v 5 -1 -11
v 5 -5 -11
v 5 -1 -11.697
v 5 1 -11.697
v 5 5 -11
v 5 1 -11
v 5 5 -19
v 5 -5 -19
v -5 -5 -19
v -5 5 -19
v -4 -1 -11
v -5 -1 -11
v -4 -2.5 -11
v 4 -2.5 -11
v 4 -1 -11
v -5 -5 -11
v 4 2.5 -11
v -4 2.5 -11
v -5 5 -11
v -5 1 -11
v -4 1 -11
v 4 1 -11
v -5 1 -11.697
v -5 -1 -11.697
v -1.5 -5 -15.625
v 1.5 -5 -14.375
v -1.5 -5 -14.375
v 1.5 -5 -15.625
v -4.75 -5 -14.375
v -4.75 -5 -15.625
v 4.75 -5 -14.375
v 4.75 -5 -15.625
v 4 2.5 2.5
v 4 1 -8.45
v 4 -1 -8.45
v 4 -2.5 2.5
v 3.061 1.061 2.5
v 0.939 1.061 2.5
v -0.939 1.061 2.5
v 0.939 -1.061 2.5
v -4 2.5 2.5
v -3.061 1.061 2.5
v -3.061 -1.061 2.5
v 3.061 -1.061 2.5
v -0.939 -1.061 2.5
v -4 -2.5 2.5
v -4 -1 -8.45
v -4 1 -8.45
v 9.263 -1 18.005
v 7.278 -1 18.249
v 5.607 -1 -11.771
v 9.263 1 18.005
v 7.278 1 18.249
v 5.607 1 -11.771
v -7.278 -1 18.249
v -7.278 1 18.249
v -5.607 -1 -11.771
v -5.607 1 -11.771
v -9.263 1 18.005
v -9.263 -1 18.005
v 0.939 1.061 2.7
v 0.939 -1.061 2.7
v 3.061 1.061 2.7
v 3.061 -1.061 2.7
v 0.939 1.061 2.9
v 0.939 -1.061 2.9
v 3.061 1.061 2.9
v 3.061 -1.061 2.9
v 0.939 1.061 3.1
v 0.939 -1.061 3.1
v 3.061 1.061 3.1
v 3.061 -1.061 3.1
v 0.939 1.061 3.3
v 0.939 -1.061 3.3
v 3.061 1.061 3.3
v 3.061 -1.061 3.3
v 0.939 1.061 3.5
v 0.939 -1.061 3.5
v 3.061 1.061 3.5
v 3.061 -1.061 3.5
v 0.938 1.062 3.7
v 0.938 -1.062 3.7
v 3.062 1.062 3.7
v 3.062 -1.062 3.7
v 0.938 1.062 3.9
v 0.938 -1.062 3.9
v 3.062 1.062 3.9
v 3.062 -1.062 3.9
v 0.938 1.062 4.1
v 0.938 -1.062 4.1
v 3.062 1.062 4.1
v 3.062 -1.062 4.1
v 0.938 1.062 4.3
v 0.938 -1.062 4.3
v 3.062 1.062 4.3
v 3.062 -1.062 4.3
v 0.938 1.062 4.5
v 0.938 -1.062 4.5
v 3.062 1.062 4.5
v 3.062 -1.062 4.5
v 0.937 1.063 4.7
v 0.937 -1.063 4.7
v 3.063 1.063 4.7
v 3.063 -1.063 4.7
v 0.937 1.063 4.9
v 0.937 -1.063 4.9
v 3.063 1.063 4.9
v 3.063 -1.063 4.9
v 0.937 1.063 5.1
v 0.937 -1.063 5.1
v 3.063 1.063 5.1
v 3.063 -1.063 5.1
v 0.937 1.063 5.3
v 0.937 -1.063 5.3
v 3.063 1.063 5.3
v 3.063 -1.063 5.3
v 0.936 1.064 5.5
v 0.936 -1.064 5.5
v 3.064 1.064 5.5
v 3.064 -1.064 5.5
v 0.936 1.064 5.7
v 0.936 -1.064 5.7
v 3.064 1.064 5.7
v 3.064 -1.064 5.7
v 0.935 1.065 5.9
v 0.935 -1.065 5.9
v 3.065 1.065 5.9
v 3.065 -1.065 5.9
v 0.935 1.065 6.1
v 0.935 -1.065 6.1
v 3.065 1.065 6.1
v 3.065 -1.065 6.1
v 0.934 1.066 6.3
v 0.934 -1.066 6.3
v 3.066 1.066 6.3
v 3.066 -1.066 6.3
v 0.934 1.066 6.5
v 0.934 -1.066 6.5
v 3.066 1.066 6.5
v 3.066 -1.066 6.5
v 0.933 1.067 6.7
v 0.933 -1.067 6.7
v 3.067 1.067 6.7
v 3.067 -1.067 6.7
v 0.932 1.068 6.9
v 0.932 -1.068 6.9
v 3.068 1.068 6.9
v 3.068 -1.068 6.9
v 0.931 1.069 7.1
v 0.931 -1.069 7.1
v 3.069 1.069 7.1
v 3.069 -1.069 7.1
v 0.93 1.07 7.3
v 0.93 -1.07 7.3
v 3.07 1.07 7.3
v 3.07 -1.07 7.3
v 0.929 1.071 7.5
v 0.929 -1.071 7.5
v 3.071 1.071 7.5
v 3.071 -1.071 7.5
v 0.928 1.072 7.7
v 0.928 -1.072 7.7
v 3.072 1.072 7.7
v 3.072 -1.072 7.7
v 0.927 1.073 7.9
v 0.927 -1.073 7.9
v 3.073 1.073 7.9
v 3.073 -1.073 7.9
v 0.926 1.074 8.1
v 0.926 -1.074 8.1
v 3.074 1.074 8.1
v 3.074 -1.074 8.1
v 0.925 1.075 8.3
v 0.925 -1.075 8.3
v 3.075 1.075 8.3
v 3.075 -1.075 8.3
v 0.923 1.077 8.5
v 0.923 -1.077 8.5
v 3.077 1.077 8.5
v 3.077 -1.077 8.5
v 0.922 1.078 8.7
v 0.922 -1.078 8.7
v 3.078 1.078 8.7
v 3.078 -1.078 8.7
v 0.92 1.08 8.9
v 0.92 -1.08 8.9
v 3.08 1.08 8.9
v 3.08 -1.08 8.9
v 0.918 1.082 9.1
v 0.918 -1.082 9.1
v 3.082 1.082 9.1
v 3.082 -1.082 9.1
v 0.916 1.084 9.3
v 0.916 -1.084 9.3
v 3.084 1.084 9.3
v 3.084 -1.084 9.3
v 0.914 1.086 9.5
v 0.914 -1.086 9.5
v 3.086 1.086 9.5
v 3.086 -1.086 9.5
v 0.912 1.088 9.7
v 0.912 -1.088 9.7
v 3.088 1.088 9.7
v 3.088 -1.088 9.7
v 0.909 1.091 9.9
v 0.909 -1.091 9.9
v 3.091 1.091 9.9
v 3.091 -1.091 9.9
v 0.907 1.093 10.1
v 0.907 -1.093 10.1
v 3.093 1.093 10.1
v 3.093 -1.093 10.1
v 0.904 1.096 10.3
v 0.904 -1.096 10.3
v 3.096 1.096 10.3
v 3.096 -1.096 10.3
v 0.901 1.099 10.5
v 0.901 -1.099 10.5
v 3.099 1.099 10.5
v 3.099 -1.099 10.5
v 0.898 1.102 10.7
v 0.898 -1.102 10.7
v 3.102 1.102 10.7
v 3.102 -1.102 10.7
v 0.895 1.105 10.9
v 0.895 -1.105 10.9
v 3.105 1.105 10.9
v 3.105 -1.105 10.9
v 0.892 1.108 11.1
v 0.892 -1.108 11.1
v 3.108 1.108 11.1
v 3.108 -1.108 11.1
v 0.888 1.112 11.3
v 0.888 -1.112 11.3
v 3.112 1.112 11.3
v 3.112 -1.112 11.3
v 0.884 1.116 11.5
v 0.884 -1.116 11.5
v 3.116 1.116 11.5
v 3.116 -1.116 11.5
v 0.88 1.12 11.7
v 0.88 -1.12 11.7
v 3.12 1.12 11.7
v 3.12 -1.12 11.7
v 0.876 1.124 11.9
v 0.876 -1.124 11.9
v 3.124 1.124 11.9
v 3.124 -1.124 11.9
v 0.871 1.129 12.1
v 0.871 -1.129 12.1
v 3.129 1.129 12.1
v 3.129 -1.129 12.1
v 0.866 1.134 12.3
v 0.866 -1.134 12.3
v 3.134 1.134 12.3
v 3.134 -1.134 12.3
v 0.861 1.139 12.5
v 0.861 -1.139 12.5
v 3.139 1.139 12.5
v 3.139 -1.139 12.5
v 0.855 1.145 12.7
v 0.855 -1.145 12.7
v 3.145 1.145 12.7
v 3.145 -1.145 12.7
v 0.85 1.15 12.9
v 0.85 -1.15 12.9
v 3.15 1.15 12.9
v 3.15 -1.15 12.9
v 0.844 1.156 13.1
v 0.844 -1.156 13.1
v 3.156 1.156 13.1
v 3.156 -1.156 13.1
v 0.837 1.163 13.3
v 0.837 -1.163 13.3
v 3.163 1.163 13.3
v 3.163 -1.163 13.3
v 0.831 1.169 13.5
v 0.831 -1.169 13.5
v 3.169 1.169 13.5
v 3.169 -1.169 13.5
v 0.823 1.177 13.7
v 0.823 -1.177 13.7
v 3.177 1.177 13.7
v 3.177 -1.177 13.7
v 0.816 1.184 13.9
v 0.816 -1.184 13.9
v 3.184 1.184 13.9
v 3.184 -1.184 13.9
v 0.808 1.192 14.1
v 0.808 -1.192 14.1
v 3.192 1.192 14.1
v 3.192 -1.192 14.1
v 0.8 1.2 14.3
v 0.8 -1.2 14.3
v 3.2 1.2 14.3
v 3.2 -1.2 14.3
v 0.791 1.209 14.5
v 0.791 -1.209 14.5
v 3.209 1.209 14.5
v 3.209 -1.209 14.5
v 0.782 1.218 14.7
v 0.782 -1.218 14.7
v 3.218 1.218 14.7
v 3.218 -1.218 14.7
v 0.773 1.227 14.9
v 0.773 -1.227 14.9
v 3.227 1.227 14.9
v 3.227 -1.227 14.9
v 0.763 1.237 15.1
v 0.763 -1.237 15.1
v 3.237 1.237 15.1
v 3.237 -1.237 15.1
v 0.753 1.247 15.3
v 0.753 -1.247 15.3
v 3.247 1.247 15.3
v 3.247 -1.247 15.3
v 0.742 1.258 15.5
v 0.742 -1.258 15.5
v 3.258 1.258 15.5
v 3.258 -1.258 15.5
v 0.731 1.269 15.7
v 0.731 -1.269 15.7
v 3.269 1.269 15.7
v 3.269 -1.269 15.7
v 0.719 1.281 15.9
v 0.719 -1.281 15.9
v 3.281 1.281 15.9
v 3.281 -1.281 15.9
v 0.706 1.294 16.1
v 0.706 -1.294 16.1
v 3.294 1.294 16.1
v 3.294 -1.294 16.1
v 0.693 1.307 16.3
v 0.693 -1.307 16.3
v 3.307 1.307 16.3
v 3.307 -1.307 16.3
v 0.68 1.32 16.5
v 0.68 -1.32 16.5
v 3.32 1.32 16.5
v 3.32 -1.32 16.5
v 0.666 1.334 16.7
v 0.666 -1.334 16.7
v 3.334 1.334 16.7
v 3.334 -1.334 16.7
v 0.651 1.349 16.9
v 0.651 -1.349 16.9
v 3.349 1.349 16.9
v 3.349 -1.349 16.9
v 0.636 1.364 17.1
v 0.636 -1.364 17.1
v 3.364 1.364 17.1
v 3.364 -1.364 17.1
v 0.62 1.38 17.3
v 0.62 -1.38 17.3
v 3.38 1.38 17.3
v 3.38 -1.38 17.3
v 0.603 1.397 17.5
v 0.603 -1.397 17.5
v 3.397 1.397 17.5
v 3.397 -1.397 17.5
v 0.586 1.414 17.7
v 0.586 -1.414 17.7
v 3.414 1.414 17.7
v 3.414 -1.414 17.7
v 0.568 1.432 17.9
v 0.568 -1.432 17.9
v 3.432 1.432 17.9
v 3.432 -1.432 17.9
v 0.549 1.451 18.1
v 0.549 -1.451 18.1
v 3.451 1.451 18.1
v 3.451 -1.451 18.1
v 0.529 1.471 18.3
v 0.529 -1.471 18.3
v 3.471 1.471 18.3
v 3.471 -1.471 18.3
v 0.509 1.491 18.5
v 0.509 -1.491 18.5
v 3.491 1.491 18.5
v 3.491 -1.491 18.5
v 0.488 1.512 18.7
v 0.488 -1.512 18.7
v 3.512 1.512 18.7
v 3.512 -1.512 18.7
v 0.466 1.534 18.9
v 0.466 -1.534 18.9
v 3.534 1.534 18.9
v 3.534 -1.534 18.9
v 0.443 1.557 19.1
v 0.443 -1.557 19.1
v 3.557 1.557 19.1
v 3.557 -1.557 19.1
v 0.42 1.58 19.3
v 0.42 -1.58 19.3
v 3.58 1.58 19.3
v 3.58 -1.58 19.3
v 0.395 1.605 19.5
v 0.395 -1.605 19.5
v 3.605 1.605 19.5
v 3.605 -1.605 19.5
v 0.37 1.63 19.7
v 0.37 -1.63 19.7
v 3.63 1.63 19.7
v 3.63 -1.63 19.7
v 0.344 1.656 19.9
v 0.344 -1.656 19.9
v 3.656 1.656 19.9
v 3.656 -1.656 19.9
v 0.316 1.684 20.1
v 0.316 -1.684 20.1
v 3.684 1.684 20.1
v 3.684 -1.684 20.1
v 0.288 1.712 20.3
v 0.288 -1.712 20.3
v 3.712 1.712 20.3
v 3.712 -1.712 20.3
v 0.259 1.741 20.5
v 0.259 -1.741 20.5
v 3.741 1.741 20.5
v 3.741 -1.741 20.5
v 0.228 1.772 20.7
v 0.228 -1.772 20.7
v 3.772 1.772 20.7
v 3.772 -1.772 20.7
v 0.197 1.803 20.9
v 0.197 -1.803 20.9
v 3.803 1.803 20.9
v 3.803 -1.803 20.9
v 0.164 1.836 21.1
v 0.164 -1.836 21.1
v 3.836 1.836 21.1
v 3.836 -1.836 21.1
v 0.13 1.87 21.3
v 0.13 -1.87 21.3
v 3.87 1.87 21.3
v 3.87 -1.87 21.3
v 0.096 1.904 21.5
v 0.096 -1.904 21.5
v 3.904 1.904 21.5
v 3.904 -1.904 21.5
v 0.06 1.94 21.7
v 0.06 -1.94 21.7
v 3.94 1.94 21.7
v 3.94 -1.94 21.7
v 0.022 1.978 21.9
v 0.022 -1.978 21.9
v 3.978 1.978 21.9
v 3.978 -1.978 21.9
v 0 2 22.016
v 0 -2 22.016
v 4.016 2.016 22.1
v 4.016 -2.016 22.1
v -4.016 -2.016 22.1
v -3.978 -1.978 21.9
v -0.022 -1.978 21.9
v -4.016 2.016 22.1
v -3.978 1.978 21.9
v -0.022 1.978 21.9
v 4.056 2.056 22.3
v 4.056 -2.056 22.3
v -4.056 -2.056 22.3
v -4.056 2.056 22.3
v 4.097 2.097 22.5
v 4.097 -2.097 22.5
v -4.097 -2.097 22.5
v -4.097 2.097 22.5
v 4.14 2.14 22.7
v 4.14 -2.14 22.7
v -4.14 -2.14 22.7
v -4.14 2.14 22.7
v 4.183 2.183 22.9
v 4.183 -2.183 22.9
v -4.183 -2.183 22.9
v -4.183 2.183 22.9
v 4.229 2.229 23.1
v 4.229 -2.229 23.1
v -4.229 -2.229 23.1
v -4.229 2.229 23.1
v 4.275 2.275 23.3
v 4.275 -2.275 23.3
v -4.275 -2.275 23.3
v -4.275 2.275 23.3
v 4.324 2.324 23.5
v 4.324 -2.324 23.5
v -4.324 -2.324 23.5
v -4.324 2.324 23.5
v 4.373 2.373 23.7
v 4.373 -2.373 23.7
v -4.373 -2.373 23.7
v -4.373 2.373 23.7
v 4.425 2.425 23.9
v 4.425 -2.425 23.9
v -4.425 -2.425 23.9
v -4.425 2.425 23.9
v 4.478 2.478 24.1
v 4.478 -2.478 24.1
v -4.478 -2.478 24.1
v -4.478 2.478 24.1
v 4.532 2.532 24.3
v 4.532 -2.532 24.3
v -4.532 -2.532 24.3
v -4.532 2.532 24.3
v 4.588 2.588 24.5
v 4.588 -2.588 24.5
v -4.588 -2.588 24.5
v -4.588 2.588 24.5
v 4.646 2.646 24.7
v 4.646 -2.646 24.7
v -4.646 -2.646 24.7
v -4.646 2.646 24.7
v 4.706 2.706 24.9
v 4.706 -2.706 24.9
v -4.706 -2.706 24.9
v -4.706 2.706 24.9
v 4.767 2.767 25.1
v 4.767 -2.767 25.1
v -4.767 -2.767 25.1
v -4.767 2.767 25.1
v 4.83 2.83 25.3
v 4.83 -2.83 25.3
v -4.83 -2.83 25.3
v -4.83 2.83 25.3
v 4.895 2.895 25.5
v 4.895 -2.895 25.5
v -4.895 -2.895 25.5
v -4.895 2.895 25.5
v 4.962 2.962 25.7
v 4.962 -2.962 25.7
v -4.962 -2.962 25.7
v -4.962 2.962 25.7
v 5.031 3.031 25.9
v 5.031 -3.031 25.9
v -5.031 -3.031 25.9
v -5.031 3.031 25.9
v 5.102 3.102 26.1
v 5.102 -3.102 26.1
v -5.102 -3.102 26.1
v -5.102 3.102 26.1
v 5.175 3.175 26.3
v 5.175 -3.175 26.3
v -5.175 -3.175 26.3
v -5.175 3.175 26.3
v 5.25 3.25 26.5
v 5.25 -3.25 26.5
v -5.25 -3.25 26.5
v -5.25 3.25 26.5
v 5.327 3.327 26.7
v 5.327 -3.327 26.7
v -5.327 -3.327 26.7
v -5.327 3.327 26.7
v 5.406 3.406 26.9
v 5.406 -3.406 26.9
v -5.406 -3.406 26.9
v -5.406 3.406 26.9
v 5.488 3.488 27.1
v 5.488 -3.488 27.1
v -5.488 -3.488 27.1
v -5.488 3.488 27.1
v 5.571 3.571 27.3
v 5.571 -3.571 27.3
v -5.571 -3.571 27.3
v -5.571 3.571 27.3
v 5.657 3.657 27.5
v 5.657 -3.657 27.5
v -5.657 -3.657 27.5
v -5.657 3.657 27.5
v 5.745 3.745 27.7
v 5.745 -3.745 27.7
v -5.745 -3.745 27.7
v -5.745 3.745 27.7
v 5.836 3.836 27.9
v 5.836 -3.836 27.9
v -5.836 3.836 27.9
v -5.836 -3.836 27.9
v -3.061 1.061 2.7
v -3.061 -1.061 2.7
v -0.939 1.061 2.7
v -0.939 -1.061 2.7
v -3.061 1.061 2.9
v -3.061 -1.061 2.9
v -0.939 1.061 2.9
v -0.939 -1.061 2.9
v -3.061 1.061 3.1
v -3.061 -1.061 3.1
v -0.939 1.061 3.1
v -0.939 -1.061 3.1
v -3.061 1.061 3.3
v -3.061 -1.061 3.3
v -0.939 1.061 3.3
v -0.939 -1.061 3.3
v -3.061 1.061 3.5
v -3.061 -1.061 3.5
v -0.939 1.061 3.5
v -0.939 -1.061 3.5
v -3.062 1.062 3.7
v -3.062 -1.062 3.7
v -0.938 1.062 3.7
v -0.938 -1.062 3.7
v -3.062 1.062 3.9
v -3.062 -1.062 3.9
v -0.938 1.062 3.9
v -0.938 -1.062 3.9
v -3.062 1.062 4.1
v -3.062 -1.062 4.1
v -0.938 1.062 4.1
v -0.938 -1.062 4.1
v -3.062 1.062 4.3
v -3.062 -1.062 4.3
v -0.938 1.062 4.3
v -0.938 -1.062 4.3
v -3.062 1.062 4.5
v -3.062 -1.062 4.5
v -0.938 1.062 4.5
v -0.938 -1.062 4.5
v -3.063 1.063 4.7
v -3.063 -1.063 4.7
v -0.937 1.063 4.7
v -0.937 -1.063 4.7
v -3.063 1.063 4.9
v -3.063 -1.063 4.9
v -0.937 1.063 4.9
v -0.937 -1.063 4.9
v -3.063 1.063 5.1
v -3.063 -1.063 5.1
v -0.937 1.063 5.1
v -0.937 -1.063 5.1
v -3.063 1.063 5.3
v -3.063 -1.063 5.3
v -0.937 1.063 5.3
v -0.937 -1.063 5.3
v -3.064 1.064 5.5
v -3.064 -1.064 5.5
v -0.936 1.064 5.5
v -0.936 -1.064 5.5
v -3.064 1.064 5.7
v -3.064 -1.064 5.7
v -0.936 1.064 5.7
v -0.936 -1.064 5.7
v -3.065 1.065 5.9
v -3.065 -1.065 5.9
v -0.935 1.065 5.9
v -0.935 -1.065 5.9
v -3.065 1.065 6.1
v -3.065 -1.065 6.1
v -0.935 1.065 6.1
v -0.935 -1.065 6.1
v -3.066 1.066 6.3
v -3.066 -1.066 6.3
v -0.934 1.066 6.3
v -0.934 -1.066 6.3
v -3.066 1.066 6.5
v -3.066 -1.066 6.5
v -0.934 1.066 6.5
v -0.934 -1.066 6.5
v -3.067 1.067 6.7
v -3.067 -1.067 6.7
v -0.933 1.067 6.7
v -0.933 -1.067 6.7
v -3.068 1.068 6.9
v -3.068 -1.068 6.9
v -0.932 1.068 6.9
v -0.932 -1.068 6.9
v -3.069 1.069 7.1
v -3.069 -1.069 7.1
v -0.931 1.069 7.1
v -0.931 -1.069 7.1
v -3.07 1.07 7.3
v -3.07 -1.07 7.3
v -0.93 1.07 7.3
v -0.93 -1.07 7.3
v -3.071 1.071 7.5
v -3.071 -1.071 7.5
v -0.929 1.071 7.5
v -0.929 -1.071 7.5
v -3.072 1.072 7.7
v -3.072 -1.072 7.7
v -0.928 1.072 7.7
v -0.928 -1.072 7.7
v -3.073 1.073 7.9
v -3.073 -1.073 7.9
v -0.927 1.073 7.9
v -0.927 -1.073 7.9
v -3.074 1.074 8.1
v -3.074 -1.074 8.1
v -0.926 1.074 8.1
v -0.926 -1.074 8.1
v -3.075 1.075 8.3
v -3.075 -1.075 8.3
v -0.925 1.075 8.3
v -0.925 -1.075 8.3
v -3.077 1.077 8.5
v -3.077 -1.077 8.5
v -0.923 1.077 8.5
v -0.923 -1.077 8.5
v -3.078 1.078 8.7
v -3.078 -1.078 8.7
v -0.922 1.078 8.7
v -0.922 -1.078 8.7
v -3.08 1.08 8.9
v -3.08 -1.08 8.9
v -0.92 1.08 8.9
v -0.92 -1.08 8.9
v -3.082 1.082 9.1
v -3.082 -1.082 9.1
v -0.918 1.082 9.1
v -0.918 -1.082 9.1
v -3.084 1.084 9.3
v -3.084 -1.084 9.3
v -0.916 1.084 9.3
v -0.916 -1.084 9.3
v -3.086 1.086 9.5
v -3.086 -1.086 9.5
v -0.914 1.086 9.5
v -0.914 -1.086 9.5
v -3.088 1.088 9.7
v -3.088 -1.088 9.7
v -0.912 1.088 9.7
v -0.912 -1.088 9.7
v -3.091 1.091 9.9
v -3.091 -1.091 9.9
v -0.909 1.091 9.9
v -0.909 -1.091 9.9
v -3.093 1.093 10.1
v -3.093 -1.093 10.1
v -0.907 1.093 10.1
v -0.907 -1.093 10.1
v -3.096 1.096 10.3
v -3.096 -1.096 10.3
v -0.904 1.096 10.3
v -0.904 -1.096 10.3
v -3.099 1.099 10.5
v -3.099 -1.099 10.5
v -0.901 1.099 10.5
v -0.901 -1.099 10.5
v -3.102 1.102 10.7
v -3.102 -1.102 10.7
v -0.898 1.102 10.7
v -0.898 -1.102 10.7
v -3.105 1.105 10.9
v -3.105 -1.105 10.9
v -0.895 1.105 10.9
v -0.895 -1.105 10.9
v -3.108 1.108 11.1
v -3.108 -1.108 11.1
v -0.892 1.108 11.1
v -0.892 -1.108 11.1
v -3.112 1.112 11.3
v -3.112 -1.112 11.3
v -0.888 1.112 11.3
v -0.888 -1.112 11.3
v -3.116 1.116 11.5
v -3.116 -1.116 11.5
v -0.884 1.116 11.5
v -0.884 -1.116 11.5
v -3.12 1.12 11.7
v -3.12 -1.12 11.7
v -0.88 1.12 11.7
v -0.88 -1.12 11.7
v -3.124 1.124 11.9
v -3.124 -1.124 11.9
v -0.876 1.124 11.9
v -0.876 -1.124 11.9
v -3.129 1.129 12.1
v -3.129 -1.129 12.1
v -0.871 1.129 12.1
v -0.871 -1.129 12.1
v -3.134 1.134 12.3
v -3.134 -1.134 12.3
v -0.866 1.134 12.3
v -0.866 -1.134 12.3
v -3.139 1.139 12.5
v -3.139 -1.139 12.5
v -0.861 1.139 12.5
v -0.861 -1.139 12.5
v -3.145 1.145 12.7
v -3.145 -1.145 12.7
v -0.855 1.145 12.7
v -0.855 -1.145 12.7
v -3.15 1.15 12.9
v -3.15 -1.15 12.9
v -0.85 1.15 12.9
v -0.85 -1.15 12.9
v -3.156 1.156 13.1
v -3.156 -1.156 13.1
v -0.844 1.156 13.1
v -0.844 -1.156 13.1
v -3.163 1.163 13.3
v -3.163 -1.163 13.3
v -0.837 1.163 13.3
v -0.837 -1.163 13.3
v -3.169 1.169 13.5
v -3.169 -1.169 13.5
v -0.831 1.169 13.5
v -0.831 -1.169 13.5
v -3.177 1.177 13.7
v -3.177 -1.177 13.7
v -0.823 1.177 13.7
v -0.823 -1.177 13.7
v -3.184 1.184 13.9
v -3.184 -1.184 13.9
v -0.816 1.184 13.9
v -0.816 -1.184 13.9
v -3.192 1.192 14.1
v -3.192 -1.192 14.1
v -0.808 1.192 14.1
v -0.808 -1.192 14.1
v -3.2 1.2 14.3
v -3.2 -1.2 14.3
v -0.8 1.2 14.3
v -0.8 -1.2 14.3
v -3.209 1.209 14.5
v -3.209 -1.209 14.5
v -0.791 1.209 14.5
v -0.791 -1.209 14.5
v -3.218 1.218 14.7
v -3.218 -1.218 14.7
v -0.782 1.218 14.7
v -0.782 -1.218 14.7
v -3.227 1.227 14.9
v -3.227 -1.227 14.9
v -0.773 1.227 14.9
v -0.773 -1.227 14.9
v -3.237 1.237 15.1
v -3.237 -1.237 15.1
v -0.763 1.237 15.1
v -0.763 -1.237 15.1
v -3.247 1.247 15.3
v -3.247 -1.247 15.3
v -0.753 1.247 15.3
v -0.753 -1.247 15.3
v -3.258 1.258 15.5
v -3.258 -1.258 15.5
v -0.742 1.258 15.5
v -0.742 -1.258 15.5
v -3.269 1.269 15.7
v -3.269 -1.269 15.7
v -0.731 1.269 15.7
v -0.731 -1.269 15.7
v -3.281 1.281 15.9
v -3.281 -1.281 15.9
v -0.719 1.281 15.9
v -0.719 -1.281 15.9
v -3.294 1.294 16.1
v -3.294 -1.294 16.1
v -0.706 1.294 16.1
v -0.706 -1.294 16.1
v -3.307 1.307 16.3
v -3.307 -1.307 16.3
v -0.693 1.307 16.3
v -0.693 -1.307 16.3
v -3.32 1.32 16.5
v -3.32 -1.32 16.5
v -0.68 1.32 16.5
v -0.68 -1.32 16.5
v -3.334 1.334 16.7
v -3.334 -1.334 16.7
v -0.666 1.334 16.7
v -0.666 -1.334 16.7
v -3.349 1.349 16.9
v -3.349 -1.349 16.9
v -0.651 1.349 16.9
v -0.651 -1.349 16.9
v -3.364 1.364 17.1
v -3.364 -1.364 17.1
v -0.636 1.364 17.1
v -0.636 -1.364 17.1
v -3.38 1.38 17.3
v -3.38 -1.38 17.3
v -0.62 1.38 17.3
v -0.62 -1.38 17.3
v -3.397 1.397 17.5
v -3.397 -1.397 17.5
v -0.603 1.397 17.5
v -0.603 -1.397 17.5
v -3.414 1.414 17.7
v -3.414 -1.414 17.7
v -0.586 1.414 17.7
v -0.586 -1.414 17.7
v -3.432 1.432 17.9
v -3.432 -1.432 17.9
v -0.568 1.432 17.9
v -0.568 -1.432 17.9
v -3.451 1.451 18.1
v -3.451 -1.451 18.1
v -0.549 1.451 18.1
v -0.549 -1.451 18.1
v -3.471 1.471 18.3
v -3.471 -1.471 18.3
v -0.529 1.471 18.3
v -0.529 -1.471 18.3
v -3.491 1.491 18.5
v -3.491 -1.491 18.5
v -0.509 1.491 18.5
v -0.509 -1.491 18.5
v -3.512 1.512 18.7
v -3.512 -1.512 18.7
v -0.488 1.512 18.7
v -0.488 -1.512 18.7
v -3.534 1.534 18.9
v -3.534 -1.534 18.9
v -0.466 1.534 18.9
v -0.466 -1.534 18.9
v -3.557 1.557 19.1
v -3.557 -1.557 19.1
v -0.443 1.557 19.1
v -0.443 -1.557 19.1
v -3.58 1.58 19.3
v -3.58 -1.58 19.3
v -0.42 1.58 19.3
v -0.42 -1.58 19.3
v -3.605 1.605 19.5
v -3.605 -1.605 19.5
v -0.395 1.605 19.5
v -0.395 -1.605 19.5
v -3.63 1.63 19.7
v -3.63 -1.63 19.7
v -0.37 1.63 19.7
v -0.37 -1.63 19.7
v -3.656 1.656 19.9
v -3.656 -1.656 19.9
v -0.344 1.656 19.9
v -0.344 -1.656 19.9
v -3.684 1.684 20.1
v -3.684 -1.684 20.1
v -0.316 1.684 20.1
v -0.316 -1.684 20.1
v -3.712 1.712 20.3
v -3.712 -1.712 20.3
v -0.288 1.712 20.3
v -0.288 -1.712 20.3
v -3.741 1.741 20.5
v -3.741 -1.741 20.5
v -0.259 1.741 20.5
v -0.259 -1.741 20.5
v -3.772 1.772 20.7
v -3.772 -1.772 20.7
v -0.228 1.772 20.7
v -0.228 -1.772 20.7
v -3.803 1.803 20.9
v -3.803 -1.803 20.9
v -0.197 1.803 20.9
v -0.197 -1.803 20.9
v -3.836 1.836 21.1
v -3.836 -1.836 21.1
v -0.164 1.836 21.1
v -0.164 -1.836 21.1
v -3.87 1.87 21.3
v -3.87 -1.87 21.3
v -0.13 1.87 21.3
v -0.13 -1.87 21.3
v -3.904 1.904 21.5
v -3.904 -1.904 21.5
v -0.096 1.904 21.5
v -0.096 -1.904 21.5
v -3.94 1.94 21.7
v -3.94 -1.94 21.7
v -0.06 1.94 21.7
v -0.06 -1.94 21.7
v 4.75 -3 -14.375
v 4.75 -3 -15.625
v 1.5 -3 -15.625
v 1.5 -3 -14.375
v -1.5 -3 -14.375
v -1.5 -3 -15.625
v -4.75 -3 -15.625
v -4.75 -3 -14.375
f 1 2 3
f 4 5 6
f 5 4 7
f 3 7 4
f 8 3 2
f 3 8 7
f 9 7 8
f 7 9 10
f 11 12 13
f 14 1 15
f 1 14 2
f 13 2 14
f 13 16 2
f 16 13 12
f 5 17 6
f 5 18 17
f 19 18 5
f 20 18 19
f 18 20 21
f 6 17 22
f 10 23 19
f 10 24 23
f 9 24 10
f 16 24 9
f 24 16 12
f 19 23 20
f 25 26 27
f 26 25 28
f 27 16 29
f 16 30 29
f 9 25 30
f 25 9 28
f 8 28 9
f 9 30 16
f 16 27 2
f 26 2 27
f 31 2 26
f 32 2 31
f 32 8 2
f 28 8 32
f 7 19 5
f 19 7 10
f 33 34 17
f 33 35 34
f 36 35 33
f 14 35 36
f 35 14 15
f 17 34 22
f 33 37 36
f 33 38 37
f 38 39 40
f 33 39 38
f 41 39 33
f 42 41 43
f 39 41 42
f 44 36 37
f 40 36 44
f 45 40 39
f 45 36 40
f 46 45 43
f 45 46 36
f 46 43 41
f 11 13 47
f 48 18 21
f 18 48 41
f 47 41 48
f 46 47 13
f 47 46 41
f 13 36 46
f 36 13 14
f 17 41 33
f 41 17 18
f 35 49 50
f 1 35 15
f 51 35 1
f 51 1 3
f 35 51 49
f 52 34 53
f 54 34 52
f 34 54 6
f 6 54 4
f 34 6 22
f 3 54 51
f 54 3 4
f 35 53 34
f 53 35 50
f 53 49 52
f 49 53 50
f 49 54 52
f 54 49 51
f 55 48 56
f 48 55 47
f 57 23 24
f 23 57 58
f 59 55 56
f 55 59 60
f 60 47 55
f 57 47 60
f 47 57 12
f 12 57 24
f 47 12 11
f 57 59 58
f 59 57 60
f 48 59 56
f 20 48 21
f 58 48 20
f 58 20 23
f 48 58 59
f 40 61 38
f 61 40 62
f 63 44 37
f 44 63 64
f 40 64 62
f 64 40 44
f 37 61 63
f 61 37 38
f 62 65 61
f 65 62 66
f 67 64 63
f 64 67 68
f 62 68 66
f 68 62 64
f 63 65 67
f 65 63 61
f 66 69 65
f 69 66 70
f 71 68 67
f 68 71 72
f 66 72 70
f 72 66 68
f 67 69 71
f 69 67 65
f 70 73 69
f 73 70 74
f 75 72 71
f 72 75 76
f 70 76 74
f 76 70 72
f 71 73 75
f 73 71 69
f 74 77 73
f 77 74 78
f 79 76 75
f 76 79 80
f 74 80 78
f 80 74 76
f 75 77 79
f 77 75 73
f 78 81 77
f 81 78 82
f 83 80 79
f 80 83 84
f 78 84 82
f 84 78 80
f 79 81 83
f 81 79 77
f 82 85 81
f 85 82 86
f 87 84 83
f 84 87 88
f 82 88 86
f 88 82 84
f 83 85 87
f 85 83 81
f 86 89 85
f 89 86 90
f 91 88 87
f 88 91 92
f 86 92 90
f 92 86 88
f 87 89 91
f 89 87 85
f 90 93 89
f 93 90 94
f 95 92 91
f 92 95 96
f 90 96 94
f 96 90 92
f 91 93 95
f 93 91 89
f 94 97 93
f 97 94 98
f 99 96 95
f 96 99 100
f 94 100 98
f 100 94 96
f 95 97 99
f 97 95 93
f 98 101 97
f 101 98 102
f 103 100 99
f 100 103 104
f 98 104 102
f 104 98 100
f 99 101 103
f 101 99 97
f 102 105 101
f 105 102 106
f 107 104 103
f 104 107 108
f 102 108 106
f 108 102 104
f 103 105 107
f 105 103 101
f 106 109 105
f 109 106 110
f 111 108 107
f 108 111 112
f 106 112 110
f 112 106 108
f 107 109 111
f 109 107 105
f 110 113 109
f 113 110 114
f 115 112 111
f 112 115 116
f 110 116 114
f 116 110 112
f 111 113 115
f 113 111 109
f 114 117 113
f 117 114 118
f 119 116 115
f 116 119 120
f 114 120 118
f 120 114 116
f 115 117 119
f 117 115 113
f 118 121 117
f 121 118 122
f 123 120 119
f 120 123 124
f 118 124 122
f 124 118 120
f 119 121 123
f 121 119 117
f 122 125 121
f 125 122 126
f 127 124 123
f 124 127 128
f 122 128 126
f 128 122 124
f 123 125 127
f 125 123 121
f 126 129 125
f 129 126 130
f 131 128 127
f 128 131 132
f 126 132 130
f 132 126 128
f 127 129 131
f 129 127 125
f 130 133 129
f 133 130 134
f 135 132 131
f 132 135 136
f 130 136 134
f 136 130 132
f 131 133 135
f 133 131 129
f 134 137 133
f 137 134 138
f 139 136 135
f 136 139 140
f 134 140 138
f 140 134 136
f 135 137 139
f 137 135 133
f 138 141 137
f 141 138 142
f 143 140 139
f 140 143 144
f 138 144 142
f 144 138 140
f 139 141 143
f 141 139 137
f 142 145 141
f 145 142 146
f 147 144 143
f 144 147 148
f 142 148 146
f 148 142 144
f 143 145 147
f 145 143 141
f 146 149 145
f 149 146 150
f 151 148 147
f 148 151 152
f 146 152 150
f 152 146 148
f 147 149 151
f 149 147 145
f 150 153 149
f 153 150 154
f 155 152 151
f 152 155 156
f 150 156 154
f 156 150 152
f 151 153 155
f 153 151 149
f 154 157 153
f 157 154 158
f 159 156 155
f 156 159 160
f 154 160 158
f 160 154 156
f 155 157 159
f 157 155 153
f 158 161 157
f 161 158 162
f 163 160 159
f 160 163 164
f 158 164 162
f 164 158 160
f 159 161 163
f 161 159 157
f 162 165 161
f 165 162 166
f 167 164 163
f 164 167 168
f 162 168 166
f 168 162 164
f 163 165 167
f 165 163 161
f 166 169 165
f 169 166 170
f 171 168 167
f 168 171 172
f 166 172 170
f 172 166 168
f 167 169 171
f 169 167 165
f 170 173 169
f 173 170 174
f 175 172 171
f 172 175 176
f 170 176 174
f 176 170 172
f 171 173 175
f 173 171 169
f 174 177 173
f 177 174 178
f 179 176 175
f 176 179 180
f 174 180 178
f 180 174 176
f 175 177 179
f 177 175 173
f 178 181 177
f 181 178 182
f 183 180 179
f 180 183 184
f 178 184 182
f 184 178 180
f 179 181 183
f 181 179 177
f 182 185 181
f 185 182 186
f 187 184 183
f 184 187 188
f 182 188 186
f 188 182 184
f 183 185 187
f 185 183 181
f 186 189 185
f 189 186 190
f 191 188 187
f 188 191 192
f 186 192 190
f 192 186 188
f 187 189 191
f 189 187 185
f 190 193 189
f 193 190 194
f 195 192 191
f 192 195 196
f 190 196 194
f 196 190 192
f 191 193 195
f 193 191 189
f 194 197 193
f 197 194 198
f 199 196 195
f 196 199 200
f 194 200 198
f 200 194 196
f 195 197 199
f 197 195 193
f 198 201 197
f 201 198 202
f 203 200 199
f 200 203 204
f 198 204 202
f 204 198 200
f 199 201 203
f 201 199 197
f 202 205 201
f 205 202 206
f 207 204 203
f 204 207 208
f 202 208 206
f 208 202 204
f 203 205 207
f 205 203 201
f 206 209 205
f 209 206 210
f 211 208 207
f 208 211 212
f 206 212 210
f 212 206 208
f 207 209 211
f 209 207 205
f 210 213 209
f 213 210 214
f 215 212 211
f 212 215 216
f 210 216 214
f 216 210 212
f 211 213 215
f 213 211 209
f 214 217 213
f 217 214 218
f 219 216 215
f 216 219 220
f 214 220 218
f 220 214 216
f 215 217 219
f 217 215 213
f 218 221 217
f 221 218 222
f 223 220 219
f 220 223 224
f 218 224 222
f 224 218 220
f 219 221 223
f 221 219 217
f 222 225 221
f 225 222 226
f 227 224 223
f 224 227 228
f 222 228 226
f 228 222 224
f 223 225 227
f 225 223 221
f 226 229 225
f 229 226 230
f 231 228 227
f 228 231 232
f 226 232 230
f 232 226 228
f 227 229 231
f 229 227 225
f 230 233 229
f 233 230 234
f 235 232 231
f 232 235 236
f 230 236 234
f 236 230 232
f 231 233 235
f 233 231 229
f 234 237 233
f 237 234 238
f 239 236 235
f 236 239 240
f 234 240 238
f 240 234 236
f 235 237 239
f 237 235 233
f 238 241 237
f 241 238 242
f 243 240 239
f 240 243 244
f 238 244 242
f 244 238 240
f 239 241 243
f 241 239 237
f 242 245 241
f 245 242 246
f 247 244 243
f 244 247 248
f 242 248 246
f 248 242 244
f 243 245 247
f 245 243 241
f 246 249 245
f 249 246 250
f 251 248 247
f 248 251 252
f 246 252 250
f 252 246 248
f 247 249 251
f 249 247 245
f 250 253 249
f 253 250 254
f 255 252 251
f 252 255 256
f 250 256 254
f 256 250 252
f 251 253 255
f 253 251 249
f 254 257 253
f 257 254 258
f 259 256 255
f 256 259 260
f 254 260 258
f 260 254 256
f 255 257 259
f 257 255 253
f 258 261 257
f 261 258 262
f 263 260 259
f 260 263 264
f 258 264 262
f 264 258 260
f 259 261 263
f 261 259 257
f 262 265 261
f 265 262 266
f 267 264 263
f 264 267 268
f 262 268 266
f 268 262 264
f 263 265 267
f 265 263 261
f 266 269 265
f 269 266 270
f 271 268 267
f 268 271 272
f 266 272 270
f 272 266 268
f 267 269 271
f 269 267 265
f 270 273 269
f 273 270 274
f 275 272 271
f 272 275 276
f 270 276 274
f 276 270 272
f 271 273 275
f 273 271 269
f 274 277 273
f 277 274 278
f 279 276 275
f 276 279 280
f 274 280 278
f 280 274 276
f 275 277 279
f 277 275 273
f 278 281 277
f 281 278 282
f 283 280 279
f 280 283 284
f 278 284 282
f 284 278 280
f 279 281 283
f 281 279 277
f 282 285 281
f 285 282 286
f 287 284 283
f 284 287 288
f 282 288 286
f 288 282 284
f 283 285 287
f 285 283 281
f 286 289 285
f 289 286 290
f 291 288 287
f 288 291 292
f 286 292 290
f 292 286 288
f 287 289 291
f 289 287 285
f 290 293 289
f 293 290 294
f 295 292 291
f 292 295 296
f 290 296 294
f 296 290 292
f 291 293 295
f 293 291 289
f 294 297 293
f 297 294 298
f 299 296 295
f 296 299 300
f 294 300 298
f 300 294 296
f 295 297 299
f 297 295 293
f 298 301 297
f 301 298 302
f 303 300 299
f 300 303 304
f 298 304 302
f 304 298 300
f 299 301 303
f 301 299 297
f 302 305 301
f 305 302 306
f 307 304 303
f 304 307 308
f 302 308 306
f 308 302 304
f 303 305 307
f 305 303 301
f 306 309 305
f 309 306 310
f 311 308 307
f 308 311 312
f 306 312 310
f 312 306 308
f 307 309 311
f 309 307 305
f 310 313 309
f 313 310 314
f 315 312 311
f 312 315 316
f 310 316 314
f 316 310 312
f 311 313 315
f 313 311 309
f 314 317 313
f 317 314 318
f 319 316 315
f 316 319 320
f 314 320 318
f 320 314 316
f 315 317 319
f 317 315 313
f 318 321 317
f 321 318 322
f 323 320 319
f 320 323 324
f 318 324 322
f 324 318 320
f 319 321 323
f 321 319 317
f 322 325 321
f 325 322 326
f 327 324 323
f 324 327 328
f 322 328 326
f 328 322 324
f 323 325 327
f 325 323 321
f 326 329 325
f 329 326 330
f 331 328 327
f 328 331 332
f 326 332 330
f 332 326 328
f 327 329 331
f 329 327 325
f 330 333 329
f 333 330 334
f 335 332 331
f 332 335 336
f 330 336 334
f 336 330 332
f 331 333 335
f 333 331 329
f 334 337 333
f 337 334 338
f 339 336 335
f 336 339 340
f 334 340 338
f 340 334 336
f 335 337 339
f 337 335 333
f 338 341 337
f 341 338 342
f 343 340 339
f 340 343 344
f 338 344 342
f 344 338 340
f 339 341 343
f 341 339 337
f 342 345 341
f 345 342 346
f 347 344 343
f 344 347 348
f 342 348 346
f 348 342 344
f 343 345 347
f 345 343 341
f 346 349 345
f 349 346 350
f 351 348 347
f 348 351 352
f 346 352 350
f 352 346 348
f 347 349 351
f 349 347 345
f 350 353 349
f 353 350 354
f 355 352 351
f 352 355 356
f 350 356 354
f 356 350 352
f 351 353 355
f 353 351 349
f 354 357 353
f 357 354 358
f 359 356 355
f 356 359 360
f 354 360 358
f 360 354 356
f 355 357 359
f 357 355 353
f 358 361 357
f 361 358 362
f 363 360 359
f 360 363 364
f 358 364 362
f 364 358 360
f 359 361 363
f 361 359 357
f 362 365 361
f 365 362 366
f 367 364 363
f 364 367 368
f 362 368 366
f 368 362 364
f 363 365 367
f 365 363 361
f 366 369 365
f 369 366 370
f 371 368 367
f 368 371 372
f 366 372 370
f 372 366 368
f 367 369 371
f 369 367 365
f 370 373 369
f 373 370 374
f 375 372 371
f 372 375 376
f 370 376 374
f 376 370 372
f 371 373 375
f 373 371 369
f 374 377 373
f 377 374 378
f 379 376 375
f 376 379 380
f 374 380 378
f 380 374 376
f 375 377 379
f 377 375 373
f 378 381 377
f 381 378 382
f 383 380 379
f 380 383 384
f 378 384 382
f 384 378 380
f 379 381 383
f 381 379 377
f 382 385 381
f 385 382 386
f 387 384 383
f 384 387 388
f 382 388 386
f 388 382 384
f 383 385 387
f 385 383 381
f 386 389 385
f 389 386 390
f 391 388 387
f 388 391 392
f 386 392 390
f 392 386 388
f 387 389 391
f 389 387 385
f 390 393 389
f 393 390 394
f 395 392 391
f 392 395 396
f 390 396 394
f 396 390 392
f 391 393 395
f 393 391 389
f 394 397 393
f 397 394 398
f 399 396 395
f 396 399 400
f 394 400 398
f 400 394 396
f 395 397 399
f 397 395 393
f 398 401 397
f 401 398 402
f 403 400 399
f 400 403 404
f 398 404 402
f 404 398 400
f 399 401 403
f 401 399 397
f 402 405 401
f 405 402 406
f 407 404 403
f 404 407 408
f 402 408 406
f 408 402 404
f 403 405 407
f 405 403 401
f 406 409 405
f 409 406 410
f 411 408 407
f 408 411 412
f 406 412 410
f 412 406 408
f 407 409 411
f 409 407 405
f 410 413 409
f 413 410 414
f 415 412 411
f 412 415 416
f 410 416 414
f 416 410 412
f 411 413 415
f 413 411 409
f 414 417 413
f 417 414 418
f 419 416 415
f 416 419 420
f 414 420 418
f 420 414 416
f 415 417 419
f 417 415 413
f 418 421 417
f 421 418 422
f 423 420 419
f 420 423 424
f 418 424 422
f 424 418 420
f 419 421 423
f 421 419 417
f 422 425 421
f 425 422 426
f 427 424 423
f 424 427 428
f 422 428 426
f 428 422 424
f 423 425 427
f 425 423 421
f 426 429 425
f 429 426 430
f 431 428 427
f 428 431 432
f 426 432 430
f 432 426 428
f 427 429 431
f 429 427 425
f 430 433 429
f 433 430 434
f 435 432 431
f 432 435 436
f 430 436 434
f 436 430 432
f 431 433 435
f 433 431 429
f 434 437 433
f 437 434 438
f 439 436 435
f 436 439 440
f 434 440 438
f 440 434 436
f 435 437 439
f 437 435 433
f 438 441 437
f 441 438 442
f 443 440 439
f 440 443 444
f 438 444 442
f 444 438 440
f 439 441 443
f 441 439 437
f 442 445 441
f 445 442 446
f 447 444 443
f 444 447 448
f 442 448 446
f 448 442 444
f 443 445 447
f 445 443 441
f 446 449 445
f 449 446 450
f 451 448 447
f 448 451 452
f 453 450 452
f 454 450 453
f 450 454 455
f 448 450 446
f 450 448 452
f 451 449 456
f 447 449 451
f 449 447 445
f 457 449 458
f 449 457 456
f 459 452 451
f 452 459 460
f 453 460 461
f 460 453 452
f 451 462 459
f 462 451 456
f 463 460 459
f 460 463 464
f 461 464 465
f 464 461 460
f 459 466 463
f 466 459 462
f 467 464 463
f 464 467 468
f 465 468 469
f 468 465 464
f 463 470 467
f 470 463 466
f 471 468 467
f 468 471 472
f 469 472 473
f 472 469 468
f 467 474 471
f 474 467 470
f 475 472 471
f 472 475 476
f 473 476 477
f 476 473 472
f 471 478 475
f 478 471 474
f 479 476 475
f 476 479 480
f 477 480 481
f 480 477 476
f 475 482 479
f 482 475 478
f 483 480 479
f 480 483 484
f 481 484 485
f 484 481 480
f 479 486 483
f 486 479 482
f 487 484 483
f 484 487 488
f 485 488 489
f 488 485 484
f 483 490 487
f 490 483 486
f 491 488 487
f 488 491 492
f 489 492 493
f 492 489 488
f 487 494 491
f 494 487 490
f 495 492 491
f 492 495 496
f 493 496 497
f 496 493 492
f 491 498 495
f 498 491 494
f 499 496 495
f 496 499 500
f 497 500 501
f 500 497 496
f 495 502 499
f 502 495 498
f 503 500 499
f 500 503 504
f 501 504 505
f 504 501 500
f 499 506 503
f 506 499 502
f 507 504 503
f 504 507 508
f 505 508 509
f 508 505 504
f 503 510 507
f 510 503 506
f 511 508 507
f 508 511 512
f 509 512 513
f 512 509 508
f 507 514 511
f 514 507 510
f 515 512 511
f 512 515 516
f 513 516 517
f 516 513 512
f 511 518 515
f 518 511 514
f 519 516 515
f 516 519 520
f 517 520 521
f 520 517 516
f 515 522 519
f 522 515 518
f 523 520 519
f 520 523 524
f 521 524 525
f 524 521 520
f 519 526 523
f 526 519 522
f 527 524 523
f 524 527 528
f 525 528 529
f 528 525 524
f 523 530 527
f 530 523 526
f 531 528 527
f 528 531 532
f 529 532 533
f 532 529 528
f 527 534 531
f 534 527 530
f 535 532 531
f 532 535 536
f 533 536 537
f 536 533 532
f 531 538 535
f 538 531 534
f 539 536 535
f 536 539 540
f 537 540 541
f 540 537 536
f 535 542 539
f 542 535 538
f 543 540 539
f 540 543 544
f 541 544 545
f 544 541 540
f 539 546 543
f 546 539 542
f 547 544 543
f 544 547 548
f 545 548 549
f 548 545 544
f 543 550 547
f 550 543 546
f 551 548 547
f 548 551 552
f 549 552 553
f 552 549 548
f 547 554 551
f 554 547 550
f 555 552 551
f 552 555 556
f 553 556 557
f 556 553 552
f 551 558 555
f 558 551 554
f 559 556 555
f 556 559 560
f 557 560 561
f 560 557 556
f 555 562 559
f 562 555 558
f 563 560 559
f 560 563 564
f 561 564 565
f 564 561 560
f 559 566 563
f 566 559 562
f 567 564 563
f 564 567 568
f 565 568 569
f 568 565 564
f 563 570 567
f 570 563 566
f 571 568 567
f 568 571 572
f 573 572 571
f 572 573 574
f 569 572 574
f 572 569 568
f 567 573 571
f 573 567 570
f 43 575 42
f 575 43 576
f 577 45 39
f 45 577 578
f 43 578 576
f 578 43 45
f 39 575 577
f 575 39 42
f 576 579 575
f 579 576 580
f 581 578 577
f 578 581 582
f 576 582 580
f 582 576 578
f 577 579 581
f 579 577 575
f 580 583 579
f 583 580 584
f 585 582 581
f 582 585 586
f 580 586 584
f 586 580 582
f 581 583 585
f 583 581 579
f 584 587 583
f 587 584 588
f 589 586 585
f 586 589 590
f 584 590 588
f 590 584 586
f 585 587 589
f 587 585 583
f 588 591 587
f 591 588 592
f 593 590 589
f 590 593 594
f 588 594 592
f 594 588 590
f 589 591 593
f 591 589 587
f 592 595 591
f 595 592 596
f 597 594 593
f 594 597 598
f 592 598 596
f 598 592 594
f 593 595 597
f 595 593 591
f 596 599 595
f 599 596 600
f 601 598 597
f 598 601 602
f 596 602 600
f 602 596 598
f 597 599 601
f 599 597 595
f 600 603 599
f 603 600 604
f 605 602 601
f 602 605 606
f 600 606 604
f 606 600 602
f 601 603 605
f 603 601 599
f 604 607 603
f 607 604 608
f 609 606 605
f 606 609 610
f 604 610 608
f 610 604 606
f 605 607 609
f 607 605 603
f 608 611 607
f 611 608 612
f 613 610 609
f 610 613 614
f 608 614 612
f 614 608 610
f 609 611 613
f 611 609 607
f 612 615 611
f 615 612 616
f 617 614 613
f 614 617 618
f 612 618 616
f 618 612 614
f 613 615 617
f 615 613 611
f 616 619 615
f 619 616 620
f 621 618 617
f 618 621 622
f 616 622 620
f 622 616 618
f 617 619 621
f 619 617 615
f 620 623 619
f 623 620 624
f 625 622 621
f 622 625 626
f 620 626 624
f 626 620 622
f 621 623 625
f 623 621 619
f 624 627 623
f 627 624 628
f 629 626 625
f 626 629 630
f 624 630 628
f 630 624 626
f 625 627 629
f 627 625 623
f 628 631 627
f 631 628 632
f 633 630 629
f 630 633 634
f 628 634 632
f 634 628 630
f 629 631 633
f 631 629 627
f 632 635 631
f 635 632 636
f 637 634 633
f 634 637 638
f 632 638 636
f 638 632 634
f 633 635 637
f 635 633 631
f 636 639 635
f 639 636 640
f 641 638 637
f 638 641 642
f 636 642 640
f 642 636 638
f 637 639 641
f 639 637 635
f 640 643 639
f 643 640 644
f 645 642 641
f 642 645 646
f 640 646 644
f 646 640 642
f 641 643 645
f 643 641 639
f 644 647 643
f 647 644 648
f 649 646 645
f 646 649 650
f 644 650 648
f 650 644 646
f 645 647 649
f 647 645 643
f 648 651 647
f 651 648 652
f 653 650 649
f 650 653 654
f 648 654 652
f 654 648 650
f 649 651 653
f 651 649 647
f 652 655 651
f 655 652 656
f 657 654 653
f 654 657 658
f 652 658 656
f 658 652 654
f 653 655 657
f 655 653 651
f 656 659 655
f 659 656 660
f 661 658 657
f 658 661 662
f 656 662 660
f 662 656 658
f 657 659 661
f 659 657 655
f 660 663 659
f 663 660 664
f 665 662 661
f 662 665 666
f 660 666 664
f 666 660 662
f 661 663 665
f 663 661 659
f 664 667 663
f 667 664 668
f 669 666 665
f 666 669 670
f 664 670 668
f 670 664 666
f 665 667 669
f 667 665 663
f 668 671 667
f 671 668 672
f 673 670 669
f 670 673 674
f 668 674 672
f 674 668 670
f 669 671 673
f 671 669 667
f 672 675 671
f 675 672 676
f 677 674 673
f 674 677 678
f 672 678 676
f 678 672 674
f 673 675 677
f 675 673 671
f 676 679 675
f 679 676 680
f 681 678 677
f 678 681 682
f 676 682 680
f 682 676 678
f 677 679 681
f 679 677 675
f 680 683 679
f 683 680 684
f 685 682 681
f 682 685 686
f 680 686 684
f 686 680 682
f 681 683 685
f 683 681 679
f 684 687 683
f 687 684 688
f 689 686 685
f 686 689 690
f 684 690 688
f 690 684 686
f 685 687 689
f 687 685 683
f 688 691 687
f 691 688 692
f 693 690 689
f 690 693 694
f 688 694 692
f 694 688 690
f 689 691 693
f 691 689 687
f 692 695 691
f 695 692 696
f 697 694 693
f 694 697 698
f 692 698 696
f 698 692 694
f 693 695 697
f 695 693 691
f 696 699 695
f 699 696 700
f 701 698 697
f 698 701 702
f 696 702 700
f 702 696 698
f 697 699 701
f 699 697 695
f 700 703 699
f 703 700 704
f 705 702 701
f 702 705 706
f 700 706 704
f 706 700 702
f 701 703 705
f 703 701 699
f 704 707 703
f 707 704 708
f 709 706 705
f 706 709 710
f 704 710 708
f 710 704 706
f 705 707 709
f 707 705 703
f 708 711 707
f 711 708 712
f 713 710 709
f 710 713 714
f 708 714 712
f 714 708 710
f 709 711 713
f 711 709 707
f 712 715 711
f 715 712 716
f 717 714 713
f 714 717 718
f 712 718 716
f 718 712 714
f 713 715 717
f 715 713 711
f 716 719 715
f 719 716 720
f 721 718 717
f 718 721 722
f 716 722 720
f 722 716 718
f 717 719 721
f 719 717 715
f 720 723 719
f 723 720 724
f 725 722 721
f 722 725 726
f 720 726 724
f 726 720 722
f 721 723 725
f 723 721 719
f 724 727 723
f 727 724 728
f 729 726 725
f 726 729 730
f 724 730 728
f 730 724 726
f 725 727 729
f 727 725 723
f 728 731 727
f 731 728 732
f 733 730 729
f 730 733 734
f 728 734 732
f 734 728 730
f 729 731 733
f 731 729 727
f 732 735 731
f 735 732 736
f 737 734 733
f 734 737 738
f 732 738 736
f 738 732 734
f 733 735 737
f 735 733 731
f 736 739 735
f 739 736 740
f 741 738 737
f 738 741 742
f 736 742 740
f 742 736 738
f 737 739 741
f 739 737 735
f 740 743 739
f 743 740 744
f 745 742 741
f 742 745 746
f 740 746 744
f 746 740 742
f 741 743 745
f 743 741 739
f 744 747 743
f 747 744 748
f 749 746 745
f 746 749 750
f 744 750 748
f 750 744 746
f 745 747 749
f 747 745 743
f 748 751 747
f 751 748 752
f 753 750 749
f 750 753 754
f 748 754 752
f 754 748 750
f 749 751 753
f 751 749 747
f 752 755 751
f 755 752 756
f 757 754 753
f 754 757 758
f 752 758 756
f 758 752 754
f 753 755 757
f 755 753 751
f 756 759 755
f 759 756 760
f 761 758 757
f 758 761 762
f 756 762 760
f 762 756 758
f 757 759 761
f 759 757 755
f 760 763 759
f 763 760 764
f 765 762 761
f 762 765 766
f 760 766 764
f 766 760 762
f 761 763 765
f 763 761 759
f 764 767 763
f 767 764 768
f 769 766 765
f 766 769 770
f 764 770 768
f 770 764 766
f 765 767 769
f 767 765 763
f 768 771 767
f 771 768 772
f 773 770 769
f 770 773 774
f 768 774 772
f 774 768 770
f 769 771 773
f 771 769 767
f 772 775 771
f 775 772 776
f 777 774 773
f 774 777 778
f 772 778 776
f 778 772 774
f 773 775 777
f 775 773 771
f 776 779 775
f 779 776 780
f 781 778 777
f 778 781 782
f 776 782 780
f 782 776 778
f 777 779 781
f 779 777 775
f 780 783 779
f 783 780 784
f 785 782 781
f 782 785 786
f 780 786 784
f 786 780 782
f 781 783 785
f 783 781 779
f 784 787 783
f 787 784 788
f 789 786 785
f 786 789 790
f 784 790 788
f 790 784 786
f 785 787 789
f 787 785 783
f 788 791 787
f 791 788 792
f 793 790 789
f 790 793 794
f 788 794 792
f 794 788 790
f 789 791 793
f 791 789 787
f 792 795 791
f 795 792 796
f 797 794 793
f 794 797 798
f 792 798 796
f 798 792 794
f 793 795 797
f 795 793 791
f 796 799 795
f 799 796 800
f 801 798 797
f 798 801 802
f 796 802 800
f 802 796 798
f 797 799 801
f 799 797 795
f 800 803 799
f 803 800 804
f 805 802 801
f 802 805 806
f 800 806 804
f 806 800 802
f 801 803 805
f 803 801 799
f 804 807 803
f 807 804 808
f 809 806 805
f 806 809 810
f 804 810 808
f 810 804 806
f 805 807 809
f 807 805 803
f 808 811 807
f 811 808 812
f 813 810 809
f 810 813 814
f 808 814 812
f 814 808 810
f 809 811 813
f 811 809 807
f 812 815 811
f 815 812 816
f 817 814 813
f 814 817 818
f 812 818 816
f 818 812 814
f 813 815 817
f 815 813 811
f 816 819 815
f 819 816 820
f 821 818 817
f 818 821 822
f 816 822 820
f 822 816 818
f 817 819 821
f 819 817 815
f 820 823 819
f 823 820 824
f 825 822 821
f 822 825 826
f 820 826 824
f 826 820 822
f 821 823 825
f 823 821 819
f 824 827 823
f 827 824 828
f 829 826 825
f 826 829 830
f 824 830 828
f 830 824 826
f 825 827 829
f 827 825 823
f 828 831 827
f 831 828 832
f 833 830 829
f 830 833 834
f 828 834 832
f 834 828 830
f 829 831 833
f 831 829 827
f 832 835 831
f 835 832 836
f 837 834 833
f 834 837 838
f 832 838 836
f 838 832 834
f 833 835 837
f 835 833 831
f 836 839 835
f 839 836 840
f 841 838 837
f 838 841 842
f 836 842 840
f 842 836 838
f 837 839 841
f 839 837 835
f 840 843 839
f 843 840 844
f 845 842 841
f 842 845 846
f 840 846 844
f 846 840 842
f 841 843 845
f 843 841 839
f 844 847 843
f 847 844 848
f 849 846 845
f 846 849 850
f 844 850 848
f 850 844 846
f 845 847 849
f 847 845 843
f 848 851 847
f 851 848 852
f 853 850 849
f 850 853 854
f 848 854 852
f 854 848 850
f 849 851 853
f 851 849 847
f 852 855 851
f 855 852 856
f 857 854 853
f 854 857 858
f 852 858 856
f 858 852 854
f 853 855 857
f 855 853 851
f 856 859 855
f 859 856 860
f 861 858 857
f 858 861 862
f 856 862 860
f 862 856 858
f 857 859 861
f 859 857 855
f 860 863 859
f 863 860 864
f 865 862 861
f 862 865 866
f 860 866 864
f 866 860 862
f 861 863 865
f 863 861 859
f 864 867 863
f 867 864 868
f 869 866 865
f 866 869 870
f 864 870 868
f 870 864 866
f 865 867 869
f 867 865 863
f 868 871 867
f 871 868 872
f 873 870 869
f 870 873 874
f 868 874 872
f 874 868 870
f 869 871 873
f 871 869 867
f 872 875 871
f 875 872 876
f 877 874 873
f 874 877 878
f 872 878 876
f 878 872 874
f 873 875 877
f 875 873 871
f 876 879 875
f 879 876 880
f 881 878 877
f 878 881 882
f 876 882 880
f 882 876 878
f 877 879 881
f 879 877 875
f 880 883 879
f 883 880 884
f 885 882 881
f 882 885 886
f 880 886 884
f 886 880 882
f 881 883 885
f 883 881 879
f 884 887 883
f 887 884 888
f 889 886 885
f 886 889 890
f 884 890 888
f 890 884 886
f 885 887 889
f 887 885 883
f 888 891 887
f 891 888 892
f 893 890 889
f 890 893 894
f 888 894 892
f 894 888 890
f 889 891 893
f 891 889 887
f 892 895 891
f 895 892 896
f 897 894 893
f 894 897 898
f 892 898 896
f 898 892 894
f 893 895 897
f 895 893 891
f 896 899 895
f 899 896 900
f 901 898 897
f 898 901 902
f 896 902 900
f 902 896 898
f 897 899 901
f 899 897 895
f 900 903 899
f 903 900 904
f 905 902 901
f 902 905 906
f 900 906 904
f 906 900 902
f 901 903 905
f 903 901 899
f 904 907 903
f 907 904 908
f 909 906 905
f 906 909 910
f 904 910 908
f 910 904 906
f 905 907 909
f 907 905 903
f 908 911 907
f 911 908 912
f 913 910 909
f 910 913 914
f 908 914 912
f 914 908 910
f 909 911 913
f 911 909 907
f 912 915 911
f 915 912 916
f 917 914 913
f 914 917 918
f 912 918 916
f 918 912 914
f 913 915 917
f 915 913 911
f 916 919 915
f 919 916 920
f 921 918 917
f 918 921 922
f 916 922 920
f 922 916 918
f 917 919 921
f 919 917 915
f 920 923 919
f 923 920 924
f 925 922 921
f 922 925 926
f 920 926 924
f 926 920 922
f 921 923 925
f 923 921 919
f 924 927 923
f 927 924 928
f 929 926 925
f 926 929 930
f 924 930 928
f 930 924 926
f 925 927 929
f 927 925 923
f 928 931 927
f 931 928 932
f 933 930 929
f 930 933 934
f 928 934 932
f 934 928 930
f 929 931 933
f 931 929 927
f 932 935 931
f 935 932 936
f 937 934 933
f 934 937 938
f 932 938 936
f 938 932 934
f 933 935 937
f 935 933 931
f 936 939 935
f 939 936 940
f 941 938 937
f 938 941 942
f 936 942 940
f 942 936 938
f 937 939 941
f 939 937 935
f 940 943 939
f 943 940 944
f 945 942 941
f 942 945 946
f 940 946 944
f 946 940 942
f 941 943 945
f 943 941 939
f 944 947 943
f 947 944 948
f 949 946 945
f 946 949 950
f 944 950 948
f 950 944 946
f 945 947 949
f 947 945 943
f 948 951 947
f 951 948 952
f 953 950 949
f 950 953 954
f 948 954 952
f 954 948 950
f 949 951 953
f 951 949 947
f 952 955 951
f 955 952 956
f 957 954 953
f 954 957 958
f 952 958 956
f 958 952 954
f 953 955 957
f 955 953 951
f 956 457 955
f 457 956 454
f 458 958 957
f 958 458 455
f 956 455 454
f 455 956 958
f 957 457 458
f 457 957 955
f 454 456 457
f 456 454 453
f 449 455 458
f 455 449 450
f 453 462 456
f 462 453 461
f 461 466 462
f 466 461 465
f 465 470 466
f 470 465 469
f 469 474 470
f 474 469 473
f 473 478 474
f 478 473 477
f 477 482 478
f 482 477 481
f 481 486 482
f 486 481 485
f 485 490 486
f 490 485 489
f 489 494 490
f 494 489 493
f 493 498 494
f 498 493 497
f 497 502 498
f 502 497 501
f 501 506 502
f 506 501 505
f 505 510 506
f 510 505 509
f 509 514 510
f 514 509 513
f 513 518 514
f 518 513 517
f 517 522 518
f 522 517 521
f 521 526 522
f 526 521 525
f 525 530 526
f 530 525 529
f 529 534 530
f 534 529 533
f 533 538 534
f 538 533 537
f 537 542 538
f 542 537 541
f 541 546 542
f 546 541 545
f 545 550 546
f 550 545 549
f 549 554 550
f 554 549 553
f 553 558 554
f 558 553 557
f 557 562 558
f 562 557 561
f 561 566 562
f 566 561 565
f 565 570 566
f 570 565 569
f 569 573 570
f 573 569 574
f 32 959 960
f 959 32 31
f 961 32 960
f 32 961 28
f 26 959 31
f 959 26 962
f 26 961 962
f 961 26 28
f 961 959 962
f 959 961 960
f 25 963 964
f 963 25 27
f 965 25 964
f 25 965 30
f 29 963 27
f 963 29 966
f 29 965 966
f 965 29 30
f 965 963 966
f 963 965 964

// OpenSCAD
head=10;
ancho=6*head/10;
miniancho=2*head/10;

//module for legs
module parab_leg(altura,lrate,first,iter) {
	for(i=[1:iter])
		{translate([0,0,(i-1)*altura]) cylinder(h=altura,r1=lrate*i*i+first,r2=lrate*(i+1)*(i+1)+first,center=true,$fn=4);}
}

//module for legs (5th grade)
module parab5_leg(altura,lrate,first,iter) {
	for(i=[1:iter])
		{translate([0,0,(i-1)*altura]) cylinder(h=altura,r1=lrate*i*i*i*i*i+first,r2=lrate*(i+1)*(i+1)*(i+1)*(i+1)*(i+1)+first,center=true,$fn=4);}
}

rotate([180,0,0])
color("Indigo")
difference(){
	union() {
		union() {
			union() {
					//head	
					translate([0,0,3*head/2])
					cube([head,head,head*0.8],center=true);
	
					//body
					translate([0,0,5])
					cube([head*0.8,0.5*head,3*head/2],center=true);
					}
						//arms
						rotate([0,-7,0])
						translate([head*0.6,0,-head*0.4])	
						cube([miniancho,miniancho,2.5*head+5],center=true);
	
						rotate([0,7,0])
						translate([-head*0.6,0,-head*0.4])
						cube([miniancho,miniancho,2.5*head+5],center=true);
	
				}
			//legs
			translate([head*0.2,0,head*0.2])
			rotate([180,0,45])
			parab5_leg(0.2,0.00000000005,1.5,150);
	
			translate([-head*0.2,0,head*0.2])
			rotate([180,0,45])
			parab5_leg(0.2,0.00000000005,1.5,150);
			}

	//eyes
	translate([5*head/16,head*0.8,1.5*head])
	cube([2.6*head/8,head,head/8],center=true);

	translate([-5*head/16,head*0.8,1.5*head])
	cube([2.6*head/8,head,head/8],center=true);
	}
